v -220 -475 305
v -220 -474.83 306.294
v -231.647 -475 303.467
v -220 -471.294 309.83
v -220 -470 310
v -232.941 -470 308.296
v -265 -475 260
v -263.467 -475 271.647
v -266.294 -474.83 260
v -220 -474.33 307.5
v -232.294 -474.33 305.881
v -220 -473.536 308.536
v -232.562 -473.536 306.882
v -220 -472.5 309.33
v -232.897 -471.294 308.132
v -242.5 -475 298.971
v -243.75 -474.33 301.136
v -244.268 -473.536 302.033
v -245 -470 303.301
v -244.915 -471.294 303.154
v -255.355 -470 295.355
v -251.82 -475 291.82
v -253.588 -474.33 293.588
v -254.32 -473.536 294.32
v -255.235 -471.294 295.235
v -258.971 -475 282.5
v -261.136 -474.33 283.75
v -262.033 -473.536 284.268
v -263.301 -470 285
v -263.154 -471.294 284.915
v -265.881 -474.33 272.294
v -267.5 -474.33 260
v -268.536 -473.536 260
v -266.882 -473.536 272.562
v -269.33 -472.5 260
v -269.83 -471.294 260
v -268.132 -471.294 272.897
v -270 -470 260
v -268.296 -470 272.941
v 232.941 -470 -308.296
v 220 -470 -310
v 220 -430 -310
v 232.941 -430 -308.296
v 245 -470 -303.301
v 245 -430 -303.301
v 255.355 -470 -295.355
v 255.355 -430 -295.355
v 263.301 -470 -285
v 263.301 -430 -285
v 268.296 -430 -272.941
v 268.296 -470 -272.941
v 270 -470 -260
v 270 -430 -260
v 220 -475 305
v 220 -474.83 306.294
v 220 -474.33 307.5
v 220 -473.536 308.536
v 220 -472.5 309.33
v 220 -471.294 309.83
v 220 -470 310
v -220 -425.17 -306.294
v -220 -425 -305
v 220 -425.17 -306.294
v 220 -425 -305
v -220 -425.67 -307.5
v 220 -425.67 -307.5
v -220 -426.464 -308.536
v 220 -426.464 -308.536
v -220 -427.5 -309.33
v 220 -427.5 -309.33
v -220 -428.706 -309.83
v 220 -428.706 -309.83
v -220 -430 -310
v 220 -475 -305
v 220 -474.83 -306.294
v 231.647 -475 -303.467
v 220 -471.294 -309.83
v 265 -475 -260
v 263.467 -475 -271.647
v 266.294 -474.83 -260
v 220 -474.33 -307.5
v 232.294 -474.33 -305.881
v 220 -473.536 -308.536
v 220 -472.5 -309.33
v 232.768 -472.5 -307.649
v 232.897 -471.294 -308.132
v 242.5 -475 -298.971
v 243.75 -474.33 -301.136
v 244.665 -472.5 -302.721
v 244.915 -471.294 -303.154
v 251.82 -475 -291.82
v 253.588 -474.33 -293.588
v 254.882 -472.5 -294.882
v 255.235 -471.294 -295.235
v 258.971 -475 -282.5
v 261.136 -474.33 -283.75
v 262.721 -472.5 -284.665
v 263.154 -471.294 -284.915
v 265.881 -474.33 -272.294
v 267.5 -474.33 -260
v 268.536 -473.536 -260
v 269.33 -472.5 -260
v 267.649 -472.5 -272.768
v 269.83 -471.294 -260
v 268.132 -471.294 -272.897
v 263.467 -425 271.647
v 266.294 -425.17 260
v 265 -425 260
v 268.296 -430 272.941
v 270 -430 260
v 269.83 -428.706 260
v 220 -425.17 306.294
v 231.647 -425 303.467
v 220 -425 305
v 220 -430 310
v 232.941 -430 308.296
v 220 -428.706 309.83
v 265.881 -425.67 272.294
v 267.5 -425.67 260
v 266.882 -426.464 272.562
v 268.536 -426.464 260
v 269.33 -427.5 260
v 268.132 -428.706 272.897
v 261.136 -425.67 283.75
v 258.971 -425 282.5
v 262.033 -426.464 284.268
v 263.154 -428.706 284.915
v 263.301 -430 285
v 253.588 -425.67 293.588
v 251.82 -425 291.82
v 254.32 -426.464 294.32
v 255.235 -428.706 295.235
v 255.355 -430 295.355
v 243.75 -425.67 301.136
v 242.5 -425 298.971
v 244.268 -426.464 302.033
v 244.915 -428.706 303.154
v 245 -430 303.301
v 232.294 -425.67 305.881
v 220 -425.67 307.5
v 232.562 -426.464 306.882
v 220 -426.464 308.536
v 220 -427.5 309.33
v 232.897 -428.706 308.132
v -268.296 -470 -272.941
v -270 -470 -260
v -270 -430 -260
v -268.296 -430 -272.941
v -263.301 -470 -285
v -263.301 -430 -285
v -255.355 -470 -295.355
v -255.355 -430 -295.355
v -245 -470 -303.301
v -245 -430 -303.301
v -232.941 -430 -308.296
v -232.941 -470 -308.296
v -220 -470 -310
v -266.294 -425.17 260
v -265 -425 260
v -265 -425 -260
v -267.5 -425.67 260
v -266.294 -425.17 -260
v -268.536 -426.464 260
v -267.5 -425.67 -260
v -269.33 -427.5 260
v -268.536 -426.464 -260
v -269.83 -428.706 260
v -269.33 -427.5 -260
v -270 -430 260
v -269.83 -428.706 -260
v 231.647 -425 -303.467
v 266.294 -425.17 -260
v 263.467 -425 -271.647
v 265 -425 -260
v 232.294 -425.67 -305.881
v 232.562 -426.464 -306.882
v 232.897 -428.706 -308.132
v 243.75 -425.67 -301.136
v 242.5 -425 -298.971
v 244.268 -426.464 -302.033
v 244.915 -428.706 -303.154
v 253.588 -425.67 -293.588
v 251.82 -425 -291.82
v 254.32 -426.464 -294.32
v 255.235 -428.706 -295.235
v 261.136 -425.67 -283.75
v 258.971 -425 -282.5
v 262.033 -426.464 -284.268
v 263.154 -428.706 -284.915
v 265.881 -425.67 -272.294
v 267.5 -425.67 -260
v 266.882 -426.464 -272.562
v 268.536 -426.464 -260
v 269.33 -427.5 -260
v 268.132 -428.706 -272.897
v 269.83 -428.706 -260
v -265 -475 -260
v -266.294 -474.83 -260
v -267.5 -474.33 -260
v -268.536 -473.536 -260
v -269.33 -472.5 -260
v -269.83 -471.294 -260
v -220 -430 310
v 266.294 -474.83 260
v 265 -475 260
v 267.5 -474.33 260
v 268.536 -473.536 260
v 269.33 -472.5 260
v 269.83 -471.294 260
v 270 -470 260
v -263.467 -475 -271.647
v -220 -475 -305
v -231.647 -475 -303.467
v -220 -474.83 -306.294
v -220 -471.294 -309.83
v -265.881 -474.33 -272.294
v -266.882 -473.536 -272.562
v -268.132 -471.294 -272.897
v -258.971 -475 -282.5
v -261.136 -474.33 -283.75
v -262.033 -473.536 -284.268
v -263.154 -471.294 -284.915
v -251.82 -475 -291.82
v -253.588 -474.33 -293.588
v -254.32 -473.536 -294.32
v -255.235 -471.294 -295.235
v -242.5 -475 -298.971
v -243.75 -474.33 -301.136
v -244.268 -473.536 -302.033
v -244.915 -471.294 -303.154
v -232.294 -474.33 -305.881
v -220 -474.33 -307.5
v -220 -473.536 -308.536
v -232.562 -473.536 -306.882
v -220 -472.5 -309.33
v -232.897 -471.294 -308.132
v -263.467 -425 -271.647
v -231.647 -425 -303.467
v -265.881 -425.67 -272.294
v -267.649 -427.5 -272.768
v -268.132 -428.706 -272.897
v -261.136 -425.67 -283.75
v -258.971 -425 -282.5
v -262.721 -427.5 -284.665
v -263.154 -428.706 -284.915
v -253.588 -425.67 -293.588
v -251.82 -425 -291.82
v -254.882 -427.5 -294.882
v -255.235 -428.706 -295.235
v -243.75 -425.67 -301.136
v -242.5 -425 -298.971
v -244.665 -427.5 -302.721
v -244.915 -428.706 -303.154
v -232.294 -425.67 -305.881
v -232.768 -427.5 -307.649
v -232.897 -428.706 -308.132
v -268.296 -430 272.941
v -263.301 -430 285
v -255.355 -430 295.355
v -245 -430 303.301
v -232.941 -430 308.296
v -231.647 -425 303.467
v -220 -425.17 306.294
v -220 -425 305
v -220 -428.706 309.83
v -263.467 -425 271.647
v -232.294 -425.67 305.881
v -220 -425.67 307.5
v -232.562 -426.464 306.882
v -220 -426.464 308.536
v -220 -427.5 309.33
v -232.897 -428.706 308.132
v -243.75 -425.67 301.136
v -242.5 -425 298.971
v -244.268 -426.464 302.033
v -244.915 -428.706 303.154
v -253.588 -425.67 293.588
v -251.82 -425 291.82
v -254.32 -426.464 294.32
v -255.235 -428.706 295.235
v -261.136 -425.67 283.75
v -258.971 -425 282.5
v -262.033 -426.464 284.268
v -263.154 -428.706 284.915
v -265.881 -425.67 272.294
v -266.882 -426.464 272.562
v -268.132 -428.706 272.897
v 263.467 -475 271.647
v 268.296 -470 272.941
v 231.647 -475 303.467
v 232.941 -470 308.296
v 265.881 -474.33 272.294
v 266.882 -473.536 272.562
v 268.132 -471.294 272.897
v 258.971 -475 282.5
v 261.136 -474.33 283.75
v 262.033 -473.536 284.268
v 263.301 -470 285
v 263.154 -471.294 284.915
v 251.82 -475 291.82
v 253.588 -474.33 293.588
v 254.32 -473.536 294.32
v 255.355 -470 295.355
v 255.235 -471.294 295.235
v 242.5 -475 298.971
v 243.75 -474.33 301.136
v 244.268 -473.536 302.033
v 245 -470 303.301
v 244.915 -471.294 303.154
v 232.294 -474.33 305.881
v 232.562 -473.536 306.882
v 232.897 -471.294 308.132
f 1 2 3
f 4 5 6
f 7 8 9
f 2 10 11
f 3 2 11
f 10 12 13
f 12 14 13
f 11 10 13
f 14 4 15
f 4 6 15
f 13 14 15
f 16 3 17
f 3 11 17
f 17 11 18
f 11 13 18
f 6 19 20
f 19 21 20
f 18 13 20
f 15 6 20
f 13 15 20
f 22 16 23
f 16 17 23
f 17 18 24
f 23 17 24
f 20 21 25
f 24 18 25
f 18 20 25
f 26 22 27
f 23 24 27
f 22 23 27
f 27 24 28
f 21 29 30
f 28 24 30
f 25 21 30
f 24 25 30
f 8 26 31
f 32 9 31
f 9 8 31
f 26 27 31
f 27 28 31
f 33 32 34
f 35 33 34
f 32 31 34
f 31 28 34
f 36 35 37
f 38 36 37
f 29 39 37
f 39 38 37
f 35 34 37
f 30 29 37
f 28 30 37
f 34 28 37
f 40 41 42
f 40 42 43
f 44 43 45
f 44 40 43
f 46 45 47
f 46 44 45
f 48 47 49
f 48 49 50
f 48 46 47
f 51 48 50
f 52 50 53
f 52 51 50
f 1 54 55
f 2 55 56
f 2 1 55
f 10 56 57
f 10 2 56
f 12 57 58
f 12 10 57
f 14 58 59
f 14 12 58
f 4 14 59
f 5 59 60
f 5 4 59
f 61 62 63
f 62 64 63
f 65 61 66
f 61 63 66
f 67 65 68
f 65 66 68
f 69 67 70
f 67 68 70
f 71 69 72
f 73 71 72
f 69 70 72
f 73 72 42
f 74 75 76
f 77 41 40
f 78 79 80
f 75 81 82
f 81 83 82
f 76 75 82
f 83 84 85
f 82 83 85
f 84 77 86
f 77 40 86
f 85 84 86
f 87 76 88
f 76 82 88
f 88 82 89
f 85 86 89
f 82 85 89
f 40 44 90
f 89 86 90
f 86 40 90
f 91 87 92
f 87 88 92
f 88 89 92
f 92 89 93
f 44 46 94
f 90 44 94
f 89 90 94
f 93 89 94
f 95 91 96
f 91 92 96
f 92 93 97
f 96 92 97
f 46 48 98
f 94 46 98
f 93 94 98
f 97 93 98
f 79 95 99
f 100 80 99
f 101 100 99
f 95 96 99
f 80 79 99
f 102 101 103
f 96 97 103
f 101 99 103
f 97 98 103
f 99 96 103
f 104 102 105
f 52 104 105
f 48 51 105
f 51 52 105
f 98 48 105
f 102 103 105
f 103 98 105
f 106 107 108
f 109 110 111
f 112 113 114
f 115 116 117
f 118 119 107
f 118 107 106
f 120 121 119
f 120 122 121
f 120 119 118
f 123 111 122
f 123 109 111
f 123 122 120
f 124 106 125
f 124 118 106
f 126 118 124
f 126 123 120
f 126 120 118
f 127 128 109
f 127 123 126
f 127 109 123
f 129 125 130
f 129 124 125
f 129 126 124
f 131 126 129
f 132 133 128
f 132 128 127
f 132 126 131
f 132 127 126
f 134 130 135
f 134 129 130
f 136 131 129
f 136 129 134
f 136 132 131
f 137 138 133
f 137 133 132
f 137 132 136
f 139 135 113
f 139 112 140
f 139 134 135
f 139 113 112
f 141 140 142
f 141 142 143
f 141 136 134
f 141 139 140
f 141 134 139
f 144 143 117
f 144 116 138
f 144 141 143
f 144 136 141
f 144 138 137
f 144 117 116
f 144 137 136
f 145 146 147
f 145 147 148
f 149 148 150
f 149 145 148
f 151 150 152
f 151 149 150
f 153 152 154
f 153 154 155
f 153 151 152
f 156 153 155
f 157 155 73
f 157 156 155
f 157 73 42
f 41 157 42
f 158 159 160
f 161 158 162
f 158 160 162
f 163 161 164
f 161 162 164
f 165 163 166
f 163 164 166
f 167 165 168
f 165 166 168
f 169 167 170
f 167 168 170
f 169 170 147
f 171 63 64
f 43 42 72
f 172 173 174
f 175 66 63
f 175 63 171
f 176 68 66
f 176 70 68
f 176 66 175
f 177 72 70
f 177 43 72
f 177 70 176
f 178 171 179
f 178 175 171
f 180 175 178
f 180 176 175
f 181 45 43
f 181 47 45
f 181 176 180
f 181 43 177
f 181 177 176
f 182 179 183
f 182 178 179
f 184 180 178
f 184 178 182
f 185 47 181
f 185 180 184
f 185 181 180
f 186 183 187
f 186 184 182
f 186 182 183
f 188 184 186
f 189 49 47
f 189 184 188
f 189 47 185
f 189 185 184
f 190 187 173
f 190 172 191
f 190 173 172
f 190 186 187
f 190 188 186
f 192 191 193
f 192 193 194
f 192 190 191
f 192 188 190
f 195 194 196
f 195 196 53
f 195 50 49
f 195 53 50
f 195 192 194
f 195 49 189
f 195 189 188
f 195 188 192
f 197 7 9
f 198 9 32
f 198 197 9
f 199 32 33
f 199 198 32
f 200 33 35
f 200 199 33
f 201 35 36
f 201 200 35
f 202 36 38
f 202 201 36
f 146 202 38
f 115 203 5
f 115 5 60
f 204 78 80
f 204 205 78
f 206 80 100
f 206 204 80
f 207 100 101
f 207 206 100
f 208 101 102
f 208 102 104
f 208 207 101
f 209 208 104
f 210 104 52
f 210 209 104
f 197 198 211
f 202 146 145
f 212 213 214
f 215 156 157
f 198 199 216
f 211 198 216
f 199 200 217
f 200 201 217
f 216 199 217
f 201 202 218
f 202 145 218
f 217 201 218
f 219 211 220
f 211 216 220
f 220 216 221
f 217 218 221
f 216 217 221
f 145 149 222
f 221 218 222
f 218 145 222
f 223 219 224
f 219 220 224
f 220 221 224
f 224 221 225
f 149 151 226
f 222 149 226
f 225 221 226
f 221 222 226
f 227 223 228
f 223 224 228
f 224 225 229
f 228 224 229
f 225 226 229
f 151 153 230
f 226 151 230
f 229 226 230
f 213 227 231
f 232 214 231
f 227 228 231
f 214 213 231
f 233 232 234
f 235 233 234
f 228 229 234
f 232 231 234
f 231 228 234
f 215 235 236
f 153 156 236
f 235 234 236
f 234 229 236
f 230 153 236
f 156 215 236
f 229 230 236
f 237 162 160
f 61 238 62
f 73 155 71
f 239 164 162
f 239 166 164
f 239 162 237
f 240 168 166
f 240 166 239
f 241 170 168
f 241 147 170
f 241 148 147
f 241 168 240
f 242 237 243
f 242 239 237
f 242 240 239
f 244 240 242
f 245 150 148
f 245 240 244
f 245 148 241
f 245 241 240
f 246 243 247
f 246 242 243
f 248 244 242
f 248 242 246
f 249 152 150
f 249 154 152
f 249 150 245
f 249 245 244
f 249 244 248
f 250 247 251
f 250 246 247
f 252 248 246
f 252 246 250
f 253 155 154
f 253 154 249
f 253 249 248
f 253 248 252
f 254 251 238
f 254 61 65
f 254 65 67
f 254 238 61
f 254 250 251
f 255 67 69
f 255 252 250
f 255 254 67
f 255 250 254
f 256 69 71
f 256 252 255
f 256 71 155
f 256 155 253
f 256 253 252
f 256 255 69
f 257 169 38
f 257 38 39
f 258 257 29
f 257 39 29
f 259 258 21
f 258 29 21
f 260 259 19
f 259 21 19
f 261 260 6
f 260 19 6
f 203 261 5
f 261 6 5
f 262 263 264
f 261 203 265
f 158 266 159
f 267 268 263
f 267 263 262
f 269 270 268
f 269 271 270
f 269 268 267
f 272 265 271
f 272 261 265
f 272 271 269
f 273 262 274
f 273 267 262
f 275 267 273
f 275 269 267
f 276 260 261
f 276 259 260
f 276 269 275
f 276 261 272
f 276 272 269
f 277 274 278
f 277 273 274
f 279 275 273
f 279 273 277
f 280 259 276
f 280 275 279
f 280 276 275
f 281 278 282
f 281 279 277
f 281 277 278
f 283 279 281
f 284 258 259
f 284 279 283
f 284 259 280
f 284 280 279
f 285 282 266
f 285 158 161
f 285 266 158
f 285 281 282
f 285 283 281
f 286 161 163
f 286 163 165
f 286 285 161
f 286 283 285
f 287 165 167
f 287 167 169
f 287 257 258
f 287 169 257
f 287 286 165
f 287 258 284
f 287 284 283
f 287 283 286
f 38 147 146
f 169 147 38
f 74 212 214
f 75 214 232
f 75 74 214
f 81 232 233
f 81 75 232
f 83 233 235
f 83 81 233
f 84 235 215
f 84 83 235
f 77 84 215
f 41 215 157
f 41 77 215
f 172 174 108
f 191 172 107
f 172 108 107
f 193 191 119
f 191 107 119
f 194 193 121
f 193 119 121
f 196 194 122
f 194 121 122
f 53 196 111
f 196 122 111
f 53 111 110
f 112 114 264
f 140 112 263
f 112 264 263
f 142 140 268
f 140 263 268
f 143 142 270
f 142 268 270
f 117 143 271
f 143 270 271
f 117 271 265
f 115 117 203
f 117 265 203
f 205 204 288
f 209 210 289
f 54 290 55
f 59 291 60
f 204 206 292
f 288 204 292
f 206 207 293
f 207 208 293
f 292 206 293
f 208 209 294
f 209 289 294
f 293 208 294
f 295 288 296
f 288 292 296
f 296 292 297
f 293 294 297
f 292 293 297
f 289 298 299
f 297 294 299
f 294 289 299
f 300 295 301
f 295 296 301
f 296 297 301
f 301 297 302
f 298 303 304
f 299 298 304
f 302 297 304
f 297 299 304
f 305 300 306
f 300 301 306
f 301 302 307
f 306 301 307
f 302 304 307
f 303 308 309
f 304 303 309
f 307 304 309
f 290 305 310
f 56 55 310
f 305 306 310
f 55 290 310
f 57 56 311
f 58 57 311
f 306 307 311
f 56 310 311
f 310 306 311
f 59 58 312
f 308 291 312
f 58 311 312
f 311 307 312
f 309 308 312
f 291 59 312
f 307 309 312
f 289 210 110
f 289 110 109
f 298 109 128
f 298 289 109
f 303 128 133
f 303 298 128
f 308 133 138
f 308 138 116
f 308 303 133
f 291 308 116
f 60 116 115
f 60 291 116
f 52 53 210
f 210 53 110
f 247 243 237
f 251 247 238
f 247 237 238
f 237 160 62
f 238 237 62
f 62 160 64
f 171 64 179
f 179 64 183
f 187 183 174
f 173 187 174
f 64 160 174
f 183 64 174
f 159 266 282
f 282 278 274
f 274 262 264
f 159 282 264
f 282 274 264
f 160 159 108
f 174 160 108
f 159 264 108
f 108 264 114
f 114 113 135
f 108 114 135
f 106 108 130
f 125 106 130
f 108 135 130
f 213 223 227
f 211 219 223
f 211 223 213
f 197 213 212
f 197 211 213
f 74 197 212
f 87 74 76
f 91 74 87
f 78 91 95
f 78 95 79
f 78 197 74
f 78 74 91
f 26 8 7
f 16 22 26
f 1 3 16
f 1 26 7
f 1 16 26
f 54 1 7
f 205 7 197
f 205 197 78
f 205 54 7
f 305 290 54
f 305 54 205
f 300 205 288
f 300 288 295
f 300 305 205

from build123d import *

# Parameters (mm, degrees)
SKETCH001_W  = 540
SKETCH001_H  = 620
PAD001_DEPTH = 50
FILLET001_R  = 50
FILLET002_R  = 5


with BuildPart() as part:
    # Sketch001 (on Face1 of Binder) → Pad001 (new body)
    with BuildSketch(Plane.XZ.offset(425)):
        Rectangle(SKETCH001_W, SKETCH001_H)
    extrude(amount=PAD001_DEPTH)

    # Fillet001
    fillet001_edges = [part.edges().sort_by_distance(p)[0] for p in [
        (270, -450, -310),
        (-270, -450, -310),
        (270, -450, 310),
        (-270, -450, 310),
    ]]
    fillet(fillet001_edges, radius=FILLET001_R)

    # Fillet002
    fillet002_edges = [part.edges().sort_by_distance(p)[0] for p in [
        (270, -475, 0),
        (0, -425, -310),
    ]]
    fillet(fillet002_edges, radius=FILLET002_R)


solid = part.part
